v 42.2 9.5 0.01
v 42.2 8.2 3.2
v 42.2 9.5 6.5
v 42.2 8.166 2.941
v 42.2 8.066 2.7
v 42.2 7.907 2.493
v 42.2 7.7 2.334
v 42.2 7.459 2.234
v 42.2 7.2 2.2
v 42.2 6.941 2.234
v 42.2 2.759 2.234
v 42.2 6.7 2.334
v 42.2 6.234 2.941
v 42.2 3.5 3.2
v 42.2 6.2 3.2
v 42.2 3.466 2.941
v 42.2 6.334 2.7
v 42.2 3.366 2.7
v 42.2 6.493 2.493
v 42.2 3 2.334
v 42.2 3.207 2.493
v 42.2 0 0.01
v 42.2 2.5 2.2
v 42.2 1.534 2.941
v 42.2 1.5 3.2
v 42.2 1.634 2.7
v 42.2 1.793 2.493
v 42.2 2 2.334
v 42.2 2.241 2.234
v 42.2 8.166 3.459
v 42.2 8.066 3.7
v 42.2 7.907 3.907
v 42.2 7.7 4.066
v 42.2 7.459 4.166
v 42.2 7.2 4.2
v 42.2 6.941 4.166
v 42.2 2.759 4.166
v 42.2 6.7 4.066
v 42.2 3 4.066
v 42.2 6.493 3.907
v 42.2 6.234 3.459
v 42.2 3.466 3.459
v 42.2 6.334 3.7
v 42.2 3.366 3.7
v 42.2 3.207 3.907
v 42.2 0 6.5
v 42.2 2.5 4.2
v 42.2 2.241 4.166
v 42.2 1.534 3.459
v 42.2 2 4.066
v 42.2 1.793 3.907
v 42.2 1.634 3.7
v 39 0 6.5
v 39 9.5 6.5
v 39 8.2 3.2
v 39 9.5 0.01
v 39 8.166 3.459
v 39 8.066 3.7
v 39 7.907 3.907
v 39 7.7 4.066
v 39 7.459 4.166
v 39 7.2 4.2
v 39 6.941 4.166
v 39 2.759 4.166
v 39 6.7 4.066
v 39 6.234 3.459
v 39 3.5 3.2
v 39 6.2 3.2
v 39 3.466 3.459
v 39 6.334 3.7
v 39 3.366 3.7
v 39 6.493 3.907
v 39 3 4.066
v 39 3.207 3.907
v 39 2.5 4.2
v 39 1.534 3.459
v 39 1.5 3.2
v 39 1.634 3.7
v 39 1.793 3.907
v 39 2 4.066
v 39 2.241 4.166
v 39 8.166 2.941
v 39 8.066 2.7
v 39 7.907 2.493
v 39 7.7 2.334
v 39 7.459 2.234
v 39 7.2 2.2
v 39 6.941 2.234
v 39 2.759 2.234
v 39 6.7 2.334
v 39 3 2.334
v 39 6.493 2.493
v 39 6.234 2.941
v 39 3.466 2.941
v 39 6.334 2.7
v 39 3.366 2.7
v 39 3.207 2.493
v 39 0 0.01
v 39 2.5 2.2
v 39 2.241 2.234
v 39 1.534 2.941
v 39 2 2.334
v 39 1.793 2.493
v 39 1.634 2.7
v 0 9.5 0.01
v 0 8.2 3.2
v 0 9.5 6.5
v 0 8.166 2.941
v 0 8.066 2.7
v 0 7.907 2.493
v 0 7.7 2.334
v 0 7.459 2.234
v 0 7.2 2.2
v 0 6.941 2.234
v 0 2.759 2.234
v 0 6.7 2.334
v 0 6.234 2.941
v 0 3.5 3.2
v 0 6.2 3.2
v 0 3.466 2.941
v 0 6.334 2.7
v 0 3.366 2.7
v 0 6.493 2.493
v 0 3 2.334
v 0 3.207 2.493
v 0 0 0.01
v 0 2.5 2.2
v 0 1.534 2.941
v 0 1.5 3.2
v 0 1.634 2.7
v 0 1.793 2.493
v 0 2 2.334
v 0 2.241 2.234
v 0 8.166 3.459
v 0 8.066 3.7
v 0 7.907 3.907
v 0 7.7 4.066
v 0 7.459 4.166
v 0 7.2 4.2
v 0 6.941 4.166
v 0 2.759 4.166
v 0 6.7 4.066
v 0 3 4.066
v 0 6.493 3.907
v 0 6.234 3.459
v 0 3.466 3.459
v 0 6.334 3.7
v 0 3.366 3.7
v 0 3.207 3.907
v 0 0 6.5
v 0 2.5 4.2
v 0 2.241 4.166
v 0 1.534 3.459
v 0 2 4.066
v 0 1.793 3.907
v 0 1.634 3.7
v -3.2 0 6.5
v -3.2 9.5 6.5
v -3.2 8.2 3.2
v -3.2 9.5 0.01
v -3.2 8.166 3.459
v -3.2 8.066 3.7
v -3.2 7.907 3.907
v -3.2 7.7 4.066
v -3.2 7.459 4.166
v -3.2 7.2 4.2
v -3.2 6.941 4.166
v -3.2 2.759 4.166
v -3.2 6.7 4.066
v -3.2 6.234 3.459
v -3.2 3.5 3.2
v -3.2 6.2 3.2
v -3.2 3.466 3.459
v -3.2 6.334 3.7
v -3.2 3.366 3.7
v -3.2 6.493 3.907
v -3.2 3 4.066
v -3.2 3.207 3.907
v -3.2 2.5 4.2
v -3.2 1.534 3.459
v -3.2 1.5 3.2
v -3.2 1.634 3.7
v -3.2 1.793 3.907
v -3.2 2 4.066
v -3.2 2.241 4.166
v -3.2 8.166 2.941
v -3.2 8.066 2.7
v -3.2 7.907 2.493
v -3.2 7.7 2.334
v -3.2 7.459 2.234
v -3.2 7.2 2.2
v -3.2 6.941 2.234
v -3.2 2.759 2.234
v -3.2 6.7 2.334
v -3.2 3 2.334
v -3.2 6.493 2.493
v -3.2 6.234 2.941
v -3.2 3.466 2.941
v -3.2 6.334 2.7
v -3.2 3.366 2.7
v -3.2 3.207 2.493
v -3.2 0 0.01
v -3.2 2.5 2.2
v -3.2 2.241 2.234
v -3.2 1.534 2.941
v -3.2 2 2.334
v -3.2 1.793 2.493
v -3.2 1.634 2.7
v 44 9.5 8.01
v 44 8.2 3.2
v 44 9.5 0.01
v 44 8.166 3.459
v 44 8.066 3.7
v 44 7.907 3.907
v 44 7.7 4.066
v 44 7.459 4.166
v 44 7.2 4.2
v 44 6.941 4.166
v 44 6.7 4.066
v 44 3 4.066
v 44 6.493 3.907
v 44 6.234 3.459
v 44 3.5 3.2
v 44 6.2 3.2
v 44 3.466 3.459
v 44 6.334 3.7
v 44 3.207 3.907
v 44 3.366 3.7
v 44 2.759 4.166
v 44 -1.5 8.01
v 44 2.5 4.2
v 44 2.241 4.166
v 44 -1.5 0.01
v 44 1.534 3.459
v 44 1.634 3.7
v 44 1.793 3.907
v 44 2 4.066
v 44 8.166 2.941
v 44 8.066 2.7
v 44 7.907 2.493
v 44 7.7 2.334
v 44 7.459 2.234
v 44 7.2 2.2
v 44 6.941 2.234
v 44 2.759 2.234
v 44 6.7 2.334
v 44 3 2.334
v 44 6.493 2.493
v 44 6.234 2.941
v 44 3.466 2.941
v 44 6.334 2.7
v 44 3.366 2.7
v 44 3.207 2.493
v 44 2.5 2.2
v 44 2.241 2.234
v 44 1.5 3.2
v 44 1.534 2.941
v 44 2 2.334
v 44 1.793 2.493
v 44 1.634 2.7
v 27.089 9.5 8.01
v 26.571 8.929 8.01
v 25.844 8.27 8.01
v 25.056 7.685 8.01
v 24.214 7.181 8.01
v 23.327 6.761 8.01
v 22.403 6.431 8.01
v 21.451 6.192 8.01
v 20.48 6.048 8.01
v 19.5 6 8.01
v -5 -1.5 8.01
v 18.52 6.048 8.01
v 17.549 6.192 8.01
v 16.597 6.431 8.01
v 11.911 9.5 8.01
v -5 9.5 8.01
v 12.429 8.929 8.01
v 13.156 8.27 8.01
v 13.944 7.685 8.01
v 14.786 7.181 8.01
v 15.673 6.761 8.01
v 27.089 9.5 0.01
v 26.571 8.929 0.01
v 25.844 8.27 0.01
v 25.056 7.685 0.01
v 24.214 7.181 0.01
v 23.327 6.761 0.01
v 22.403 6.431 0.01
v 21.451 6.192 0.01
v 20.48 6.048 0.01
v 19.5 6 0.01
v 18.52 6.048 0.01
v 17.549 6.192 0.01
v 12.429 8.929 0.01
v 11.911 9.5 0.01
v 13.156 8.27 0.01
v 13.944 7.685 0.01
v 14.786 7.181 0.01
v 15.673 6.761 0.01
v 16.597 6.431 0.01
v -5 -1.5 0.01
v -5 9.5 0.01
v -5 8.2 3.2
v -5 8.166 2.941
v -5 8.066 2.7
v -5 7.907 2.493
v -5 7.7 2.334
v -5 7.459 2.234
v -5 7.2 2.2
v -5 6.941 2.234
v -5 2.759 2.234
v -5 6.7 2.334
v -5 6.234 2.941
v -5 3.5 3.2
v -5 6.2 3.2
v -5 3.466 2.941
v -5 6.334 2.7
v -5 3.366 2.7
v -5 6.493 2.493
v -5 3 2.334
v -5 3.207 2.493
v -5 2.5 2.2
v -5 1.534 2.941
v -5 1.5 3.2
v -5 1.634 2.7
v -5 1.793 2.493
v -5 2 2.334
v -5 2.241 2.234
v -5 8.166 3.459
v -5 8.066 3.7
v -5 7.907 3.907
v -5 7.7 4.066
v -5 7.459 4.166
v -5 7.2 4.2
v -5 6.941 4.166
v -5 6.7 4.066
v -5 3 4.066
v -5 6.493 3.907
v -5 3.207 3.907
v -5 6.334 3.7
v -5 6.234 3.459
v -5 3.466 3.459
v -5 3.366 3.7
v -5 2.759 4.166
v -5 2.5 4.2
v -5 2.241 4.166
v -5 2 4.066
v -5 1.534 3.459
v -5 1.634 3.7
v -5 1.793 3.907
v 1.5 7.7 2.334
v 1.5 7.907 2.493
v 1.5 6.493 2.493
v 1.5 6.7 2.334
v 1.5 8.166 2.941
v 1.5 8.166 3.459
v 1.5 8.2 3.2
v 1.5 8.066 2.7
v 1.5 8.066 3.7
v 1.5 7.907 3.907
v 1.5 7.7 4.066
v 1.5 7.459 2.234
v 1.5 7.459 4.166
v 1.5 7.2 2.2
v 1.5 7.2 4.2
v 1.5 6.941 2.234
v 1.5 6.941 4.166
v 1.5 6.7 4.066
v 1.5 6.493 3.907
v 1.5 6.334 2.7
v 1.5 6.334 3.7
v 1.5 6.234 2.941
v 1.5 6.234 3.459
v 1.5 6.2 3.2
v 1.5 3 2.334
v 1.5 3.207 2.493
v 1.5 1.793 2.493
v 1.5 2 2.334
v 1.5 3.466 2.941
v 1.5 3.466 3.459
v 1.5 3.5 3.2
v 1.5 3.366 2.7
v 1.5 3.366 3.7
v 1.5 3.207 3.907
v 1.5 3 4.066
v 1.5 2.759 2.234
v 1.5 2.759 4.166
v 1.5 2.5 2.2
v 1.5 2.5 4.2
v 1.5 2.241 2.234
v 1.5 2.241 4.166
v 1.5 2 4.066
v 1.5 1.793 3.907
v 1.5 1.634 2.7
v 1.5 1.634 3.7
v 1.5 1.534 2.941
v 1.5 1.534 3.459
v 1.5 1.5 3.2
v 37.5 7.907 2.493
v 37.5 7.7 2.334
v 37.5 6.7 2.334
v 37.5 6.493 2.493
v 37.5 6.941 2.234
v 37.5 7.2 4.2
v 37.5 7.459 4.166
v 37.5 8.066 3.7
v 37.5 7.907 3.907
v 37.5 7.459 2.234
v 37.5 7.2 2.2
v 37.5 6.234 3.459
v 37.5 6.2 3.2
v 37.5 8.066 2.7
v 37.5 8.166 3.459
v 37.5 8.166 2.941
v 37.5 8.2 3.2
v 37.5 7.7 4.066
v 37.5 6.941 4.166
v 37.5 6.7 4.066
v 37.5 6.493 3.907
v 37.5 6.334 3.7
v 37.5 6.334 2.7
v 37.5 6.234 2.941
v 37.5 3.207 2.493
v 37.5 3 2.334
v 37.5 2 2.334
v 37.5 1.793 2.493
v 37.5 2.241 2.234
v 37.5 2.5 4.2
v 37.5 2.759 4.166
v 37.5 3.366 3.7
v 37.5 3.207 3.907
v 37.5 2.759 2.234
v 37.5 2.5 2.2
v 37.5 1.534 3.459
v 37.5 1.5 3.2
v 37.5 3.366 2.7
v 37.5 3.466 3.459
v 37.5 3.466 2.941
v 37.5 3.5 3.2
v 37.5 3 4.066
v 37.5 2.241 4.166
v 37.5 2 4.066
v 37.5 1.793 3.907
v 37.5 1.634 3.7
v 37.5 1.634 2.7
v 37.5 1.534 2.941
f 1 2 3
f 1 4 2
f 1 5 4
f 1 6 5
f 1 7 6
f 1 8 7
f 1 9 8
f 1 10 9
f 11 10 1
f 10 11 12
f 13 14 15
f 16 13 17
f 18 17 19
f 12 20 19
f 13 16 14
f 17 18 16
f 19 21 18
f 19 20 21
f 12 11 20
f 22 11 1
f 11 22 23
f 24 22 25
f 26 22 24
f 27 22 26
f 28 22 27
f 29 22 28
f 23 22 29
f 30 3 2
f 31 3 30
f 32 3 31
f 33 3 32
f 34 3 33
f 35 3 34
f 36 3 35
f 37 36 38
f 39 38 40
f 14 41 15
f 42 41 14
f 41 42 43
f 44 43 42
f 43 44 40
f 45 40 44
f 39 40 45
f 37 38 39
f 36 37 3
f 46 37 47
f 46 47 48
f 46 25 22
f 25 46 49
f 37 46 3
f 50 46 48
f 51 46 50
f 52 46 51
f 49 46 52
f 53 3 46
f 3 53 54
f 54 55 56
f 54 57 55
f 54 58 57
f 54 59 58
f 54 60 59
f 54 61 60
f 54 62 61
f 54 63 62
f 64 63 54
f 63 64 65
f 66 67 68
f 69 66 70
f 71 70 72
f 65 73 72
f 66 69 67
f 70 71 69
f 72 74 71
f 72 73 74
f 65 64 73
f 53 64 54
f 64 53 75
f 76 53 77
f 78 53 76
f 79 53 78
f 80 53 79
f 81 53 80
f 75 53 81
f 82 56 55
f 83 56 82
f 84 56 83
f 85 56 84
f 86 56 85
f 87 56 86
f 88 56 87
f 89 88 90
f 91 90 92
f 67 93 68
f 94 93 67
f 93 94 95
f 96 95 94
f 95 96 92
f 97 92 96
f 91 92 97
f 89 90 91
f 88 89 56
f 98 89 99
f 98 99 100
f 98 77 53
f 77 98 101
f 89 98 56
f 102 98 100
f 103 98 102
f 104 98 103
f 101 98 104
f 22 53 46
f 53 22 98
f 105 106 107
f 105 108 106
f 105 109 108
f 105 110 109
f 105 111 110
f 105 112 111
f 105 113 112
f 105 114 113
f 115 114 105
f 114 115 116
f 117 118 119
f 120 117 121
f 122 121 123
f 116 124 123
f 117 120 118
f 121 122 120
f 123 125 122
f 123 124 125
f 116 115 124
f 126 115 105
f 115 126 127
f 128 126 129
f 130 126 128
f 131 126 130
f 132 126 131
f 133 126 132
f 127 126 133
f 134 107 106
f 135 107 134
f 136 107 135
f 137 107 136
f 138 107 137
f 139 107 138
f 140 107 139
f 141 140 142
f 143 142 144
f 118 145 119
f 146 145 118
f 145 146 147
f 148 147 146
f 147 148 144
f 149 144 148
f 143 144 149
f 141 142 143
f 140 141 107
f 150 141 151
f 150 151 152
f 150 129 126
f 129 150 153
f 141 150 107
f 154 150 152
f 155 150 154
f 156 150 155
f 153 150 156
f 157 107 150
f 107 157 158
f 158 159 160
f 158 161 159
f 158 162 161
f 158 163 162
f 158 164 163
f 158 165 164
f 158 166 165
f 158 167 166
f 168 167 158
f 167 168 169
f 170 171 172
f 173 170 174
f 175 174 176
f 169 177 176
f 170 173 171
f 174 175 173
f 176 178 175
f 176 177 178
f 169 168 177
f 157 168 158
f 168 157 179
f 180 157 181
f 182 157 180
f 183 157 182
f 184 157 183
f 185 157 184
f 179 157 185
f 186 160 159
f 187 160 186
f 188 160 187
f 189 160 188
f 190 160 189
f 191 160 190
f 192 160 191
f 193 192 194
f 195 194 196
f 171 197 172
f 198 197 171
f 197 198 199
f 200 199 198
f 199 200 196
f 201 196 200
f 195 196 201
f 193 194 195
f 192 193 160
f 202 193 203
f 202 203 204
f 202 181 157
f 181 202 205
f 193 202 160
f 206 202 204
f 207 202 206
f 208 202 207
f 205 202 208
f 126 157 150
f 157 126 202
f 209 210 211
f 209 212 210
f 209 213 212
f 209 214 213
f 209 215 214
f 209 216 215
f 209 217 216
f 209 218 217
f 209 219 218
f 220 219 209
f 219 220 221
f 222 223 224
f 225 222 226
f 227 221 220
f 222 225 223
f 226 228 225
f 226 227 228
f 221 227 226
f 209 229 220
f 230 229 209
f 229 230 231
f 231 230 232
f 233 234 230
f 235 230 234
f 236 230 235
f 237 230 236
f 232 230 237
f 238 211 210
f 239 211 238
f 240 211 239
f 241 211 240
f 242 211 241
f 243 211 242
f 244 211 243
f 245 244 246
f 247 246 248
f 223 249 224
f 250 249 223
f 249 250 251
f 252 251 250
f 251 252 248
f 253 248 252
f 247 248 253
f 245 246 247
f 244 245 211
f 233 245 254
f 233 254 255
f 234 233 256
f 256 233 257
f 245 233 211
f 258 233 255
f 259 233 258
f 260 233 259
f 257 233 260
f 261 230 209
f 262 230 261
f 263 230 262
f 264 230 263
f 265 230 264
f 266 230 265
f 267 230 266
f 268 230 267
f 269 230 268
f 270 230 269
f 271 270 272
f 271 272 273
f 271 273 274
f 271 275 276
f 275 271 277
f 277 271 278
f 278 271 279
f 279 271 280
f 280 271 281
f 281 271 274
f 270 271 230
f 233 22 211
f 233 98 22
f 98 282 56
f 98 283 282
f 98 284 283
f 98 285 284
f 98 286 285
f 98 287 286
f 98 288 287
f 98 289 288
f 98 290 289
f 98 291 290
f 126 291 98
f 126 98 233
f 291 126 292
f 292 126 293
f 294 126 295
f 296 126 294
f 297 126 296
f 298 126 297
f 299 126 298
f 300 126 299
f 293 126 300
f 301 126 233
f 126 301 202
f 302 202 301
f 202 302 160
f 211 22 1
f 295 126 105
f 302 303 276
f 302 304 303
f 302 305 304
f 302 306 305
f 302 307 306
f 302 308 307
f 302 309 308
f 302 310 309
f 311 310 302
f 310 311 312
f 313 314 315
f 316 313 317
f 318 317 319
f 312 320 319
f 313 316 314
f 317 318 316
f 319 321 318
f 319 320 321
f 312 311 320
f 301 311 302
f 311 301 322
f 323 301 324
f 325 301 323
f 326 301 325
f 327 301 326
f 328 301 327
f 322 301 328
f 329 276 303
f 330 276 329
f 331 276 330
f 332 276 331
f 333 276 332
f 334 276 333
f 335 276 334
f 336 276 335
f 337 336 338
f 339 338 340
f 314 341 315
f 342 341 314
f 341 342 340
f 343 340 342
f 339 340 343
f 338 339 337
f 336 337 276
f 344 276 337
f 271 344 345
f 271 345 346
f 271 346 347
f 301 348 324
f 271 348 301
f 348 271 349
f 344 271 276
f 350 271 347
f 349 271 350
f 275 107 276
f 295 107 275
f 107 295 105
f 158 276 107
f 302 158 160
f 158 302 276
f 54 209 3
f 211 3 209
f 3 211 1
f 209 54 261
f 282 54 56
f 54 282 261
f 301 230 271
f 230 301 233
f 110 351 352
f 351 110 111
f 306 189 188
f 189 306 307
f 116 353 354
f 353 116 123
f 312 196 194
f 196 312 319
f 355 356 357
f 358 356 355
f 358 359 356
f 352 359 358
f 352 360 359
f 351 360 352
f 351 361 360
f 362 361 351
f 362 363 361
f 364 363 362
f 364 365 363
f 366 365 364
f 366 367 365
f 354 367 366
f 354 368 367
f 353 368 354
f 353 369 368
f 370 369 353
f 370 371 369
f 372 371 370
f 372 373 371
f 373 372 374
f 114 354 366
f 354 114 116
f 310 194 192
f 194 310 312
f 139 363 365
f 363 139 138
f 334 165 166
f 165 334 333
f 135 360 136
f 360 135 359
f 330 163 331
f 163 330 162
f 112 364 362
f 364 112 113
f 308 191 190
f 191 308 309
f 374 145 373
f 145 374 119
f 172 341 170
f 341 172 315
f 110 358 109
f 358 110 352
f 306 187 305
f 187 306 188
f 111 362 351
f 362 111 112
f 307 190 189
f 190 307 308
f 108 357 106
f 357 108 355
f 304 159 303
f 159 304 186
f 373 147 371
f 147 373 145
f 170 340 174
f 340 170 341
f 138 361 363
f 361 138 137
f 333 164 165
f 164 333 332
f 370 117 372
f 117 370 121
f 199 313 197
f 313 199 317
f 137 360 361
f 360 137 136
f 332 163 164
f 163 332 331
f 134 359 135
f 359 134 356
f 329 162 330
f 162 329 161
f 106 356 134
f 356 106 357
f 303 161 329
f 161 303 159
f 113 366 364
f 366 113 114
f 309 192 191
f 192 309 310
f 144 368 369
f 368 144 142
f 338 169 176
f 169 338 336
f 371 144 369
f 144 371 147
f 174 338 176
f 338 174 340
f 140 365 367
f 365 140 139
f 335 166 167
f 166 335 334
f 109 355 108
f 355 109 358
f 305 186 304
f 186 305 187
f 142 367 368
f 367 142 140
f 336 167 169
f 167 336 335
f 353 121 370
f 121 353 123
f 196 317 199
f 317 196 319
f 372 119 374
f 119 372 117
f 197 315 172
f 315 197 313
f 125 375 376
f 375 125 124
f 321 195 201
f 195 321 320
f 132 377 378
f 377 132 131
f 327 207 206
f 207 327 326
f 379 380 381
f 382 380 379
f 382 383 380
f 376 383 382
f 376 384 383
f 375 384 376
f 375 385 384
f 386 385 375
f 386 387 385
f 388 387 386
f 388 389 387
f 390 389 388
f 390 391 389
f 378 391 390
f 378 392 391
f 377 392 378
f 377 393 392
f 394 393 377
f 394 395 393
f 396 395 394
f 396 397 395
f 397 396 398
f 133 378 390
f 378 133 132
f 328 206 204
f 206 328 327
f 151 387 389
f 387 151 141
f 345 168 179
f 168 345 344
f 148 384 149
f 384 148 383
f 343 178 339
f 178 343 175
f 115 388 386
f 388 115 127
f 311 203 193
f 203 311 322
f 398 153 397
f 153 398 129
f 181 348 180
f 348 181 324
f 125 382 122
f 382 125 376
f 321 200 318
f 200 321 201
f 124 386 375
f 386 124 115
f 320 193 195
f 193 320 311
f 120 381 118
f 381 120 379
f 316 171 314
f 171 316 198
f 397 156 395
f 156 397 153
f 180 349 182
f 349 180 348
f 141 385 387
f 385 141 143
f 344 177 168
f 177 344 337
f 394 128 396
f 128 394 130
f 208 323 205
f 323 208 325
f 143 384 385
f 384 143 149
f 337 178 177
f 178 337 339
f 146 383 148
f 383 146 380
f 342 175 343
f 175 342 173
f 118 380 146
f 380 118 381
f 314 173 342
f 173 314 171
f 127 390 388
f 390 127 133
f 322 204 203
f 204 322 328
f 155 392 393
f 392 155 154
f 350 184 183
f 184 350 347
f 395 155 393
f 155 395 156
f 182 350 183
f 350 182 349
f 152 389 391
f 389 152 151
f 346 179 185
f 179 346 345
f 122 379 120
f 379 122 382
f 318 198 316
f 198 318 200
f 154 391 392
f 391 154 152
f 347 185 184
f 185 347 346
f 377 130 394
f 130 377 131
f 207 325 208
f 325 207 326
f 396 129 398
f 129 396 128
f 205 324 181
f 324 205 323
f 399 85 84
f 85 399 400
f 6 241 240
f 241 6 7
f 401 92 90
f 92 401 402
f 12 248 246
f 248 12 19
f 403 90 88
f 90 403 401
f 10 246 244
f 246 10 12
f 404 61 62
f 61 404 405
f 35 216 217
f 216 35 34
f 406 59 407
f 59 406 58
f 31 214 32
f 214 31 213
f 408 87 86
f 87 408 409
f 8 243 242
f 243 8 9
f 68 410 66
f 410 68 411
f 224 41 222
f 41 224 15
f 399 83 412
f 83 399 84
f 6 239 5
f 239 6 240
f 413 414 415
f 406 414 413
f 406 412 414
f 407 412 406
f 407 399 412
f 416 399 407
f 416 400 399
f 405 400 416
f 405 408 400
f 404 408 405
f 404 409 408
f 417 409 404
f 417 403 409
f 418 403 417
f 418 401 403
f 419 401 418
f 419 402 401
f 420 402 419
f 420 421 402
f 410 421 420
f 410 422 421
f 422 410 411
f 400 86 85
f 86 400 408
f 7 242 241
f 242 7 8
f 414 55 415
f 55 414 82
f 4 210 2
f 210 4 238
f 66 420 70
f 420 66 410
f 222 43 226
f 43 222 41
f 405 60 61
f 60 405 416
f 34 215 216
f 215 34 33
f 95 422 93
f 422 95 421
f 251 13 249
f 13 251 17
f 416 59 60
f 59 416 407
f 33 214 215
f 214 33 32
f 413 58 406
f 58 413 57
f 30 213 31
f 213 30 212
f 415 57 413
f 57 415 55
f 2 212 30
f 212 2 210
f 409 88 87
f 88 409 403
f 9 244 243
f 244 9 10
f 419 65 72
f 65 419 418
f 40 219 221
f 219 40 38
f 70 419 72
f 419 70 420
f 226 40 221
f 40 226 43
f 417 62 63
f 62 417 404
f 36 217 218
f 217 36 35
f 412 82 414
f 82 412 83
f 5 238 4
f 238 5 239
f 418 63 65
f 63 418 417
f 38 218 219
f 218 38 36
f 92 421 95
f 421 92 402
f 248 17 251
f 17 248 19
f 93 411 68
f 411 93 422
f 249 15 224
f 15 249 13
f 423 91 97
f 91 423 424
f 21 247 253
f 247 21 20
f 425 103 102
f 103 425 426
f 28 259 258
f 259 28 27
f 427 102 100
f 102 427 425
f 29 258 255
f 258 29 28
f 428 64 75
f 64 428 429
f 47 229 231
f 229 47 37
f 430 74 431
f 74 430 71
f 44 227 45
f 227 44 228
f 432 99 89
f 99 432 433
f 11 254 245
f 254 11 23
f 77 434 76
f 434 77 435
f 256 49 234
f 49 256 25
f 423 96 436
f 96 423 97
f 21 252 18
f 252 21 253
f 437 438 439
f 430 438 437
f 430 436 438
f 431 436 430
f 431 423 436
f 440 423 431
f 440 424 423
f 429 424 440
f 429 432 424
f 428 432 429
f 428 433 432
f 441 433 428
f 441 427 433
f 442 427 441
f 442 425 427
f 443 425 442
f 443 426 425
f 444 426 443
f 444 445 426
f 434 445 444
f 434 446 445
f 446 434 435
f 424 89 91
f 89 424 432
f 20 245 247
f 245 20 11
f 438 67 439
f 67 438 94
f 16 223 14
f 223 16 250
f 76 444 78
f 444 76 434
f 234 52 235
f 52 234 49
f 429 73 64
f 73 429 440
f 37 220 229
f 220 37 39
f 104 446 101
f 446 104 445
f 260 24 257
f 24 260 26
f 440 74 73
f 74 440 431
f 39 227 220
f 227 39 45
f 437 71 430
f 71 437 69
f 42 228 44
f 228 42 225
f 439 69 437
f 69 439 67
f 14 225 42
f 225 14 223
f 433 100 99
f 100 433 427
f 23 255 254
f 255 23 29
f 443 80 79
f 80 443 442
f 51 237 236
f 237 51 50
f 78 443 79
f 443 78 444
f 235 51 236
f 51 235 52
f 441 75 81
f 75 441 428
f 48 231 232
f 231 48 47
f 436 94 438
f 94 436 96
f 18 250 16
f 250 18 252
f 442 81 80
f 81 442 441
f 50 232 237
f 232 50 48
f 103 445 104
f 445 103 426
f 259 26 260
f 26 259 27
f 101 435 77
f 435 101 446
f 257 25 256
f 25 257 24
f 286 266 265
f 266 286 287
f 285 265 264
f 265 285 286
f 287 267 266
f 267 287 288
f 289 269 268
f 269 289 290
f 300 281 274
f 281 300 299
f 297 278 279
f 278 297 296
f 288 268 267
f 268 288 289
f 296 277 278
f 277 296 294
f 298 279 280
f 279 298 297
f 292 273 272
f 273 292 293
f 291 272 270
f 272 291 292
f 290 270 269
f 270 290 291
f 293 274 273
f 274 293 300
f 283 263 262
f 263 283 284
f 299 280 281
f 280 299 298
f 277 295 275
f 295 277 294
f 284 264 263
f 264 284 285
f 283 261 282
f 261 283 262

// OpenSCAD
/*Rail is:
6.4 tall
3 thick
*/
module rail_end() {
   cube([3.2,12,6.5]); //rail
/*
  translate([-.5,2,3.2]) //hole 1
  rotate([0,90,0])
  cylinder(d=2, h=4, $fn=24);

  translate([-.5,7,3.2]) //hole 2
  rotate([0,90,0])
  cylinder(d=2, h=4, $fn=24);
*/
}

module pin() {
  rotate([0,90,0])
  cylinder(d=2, h=7, $fn=24);
}

module chassis() {
translate([39,0,0]) //left_rail
  rail_end(); 
translate([-3.2,0,0]) //right_rail
  rail_end(); 
}

difference() {
//Bumper
translate([-5,-1.5,.01]) cube([49,11,8]);

//pins
translate([-5.5,7.2,3.2])
  pin();
translate([-5.5,2.5,3.2])
  pin();
translate([37.5,7.2,3.2])
  pin();
translate([37.5,2.5,3.2])
  pin();

chassis();

//Servo clearance    
translate([19.5,16,-.5]) cylinder(d=20, h=10, $fn=64);
}
